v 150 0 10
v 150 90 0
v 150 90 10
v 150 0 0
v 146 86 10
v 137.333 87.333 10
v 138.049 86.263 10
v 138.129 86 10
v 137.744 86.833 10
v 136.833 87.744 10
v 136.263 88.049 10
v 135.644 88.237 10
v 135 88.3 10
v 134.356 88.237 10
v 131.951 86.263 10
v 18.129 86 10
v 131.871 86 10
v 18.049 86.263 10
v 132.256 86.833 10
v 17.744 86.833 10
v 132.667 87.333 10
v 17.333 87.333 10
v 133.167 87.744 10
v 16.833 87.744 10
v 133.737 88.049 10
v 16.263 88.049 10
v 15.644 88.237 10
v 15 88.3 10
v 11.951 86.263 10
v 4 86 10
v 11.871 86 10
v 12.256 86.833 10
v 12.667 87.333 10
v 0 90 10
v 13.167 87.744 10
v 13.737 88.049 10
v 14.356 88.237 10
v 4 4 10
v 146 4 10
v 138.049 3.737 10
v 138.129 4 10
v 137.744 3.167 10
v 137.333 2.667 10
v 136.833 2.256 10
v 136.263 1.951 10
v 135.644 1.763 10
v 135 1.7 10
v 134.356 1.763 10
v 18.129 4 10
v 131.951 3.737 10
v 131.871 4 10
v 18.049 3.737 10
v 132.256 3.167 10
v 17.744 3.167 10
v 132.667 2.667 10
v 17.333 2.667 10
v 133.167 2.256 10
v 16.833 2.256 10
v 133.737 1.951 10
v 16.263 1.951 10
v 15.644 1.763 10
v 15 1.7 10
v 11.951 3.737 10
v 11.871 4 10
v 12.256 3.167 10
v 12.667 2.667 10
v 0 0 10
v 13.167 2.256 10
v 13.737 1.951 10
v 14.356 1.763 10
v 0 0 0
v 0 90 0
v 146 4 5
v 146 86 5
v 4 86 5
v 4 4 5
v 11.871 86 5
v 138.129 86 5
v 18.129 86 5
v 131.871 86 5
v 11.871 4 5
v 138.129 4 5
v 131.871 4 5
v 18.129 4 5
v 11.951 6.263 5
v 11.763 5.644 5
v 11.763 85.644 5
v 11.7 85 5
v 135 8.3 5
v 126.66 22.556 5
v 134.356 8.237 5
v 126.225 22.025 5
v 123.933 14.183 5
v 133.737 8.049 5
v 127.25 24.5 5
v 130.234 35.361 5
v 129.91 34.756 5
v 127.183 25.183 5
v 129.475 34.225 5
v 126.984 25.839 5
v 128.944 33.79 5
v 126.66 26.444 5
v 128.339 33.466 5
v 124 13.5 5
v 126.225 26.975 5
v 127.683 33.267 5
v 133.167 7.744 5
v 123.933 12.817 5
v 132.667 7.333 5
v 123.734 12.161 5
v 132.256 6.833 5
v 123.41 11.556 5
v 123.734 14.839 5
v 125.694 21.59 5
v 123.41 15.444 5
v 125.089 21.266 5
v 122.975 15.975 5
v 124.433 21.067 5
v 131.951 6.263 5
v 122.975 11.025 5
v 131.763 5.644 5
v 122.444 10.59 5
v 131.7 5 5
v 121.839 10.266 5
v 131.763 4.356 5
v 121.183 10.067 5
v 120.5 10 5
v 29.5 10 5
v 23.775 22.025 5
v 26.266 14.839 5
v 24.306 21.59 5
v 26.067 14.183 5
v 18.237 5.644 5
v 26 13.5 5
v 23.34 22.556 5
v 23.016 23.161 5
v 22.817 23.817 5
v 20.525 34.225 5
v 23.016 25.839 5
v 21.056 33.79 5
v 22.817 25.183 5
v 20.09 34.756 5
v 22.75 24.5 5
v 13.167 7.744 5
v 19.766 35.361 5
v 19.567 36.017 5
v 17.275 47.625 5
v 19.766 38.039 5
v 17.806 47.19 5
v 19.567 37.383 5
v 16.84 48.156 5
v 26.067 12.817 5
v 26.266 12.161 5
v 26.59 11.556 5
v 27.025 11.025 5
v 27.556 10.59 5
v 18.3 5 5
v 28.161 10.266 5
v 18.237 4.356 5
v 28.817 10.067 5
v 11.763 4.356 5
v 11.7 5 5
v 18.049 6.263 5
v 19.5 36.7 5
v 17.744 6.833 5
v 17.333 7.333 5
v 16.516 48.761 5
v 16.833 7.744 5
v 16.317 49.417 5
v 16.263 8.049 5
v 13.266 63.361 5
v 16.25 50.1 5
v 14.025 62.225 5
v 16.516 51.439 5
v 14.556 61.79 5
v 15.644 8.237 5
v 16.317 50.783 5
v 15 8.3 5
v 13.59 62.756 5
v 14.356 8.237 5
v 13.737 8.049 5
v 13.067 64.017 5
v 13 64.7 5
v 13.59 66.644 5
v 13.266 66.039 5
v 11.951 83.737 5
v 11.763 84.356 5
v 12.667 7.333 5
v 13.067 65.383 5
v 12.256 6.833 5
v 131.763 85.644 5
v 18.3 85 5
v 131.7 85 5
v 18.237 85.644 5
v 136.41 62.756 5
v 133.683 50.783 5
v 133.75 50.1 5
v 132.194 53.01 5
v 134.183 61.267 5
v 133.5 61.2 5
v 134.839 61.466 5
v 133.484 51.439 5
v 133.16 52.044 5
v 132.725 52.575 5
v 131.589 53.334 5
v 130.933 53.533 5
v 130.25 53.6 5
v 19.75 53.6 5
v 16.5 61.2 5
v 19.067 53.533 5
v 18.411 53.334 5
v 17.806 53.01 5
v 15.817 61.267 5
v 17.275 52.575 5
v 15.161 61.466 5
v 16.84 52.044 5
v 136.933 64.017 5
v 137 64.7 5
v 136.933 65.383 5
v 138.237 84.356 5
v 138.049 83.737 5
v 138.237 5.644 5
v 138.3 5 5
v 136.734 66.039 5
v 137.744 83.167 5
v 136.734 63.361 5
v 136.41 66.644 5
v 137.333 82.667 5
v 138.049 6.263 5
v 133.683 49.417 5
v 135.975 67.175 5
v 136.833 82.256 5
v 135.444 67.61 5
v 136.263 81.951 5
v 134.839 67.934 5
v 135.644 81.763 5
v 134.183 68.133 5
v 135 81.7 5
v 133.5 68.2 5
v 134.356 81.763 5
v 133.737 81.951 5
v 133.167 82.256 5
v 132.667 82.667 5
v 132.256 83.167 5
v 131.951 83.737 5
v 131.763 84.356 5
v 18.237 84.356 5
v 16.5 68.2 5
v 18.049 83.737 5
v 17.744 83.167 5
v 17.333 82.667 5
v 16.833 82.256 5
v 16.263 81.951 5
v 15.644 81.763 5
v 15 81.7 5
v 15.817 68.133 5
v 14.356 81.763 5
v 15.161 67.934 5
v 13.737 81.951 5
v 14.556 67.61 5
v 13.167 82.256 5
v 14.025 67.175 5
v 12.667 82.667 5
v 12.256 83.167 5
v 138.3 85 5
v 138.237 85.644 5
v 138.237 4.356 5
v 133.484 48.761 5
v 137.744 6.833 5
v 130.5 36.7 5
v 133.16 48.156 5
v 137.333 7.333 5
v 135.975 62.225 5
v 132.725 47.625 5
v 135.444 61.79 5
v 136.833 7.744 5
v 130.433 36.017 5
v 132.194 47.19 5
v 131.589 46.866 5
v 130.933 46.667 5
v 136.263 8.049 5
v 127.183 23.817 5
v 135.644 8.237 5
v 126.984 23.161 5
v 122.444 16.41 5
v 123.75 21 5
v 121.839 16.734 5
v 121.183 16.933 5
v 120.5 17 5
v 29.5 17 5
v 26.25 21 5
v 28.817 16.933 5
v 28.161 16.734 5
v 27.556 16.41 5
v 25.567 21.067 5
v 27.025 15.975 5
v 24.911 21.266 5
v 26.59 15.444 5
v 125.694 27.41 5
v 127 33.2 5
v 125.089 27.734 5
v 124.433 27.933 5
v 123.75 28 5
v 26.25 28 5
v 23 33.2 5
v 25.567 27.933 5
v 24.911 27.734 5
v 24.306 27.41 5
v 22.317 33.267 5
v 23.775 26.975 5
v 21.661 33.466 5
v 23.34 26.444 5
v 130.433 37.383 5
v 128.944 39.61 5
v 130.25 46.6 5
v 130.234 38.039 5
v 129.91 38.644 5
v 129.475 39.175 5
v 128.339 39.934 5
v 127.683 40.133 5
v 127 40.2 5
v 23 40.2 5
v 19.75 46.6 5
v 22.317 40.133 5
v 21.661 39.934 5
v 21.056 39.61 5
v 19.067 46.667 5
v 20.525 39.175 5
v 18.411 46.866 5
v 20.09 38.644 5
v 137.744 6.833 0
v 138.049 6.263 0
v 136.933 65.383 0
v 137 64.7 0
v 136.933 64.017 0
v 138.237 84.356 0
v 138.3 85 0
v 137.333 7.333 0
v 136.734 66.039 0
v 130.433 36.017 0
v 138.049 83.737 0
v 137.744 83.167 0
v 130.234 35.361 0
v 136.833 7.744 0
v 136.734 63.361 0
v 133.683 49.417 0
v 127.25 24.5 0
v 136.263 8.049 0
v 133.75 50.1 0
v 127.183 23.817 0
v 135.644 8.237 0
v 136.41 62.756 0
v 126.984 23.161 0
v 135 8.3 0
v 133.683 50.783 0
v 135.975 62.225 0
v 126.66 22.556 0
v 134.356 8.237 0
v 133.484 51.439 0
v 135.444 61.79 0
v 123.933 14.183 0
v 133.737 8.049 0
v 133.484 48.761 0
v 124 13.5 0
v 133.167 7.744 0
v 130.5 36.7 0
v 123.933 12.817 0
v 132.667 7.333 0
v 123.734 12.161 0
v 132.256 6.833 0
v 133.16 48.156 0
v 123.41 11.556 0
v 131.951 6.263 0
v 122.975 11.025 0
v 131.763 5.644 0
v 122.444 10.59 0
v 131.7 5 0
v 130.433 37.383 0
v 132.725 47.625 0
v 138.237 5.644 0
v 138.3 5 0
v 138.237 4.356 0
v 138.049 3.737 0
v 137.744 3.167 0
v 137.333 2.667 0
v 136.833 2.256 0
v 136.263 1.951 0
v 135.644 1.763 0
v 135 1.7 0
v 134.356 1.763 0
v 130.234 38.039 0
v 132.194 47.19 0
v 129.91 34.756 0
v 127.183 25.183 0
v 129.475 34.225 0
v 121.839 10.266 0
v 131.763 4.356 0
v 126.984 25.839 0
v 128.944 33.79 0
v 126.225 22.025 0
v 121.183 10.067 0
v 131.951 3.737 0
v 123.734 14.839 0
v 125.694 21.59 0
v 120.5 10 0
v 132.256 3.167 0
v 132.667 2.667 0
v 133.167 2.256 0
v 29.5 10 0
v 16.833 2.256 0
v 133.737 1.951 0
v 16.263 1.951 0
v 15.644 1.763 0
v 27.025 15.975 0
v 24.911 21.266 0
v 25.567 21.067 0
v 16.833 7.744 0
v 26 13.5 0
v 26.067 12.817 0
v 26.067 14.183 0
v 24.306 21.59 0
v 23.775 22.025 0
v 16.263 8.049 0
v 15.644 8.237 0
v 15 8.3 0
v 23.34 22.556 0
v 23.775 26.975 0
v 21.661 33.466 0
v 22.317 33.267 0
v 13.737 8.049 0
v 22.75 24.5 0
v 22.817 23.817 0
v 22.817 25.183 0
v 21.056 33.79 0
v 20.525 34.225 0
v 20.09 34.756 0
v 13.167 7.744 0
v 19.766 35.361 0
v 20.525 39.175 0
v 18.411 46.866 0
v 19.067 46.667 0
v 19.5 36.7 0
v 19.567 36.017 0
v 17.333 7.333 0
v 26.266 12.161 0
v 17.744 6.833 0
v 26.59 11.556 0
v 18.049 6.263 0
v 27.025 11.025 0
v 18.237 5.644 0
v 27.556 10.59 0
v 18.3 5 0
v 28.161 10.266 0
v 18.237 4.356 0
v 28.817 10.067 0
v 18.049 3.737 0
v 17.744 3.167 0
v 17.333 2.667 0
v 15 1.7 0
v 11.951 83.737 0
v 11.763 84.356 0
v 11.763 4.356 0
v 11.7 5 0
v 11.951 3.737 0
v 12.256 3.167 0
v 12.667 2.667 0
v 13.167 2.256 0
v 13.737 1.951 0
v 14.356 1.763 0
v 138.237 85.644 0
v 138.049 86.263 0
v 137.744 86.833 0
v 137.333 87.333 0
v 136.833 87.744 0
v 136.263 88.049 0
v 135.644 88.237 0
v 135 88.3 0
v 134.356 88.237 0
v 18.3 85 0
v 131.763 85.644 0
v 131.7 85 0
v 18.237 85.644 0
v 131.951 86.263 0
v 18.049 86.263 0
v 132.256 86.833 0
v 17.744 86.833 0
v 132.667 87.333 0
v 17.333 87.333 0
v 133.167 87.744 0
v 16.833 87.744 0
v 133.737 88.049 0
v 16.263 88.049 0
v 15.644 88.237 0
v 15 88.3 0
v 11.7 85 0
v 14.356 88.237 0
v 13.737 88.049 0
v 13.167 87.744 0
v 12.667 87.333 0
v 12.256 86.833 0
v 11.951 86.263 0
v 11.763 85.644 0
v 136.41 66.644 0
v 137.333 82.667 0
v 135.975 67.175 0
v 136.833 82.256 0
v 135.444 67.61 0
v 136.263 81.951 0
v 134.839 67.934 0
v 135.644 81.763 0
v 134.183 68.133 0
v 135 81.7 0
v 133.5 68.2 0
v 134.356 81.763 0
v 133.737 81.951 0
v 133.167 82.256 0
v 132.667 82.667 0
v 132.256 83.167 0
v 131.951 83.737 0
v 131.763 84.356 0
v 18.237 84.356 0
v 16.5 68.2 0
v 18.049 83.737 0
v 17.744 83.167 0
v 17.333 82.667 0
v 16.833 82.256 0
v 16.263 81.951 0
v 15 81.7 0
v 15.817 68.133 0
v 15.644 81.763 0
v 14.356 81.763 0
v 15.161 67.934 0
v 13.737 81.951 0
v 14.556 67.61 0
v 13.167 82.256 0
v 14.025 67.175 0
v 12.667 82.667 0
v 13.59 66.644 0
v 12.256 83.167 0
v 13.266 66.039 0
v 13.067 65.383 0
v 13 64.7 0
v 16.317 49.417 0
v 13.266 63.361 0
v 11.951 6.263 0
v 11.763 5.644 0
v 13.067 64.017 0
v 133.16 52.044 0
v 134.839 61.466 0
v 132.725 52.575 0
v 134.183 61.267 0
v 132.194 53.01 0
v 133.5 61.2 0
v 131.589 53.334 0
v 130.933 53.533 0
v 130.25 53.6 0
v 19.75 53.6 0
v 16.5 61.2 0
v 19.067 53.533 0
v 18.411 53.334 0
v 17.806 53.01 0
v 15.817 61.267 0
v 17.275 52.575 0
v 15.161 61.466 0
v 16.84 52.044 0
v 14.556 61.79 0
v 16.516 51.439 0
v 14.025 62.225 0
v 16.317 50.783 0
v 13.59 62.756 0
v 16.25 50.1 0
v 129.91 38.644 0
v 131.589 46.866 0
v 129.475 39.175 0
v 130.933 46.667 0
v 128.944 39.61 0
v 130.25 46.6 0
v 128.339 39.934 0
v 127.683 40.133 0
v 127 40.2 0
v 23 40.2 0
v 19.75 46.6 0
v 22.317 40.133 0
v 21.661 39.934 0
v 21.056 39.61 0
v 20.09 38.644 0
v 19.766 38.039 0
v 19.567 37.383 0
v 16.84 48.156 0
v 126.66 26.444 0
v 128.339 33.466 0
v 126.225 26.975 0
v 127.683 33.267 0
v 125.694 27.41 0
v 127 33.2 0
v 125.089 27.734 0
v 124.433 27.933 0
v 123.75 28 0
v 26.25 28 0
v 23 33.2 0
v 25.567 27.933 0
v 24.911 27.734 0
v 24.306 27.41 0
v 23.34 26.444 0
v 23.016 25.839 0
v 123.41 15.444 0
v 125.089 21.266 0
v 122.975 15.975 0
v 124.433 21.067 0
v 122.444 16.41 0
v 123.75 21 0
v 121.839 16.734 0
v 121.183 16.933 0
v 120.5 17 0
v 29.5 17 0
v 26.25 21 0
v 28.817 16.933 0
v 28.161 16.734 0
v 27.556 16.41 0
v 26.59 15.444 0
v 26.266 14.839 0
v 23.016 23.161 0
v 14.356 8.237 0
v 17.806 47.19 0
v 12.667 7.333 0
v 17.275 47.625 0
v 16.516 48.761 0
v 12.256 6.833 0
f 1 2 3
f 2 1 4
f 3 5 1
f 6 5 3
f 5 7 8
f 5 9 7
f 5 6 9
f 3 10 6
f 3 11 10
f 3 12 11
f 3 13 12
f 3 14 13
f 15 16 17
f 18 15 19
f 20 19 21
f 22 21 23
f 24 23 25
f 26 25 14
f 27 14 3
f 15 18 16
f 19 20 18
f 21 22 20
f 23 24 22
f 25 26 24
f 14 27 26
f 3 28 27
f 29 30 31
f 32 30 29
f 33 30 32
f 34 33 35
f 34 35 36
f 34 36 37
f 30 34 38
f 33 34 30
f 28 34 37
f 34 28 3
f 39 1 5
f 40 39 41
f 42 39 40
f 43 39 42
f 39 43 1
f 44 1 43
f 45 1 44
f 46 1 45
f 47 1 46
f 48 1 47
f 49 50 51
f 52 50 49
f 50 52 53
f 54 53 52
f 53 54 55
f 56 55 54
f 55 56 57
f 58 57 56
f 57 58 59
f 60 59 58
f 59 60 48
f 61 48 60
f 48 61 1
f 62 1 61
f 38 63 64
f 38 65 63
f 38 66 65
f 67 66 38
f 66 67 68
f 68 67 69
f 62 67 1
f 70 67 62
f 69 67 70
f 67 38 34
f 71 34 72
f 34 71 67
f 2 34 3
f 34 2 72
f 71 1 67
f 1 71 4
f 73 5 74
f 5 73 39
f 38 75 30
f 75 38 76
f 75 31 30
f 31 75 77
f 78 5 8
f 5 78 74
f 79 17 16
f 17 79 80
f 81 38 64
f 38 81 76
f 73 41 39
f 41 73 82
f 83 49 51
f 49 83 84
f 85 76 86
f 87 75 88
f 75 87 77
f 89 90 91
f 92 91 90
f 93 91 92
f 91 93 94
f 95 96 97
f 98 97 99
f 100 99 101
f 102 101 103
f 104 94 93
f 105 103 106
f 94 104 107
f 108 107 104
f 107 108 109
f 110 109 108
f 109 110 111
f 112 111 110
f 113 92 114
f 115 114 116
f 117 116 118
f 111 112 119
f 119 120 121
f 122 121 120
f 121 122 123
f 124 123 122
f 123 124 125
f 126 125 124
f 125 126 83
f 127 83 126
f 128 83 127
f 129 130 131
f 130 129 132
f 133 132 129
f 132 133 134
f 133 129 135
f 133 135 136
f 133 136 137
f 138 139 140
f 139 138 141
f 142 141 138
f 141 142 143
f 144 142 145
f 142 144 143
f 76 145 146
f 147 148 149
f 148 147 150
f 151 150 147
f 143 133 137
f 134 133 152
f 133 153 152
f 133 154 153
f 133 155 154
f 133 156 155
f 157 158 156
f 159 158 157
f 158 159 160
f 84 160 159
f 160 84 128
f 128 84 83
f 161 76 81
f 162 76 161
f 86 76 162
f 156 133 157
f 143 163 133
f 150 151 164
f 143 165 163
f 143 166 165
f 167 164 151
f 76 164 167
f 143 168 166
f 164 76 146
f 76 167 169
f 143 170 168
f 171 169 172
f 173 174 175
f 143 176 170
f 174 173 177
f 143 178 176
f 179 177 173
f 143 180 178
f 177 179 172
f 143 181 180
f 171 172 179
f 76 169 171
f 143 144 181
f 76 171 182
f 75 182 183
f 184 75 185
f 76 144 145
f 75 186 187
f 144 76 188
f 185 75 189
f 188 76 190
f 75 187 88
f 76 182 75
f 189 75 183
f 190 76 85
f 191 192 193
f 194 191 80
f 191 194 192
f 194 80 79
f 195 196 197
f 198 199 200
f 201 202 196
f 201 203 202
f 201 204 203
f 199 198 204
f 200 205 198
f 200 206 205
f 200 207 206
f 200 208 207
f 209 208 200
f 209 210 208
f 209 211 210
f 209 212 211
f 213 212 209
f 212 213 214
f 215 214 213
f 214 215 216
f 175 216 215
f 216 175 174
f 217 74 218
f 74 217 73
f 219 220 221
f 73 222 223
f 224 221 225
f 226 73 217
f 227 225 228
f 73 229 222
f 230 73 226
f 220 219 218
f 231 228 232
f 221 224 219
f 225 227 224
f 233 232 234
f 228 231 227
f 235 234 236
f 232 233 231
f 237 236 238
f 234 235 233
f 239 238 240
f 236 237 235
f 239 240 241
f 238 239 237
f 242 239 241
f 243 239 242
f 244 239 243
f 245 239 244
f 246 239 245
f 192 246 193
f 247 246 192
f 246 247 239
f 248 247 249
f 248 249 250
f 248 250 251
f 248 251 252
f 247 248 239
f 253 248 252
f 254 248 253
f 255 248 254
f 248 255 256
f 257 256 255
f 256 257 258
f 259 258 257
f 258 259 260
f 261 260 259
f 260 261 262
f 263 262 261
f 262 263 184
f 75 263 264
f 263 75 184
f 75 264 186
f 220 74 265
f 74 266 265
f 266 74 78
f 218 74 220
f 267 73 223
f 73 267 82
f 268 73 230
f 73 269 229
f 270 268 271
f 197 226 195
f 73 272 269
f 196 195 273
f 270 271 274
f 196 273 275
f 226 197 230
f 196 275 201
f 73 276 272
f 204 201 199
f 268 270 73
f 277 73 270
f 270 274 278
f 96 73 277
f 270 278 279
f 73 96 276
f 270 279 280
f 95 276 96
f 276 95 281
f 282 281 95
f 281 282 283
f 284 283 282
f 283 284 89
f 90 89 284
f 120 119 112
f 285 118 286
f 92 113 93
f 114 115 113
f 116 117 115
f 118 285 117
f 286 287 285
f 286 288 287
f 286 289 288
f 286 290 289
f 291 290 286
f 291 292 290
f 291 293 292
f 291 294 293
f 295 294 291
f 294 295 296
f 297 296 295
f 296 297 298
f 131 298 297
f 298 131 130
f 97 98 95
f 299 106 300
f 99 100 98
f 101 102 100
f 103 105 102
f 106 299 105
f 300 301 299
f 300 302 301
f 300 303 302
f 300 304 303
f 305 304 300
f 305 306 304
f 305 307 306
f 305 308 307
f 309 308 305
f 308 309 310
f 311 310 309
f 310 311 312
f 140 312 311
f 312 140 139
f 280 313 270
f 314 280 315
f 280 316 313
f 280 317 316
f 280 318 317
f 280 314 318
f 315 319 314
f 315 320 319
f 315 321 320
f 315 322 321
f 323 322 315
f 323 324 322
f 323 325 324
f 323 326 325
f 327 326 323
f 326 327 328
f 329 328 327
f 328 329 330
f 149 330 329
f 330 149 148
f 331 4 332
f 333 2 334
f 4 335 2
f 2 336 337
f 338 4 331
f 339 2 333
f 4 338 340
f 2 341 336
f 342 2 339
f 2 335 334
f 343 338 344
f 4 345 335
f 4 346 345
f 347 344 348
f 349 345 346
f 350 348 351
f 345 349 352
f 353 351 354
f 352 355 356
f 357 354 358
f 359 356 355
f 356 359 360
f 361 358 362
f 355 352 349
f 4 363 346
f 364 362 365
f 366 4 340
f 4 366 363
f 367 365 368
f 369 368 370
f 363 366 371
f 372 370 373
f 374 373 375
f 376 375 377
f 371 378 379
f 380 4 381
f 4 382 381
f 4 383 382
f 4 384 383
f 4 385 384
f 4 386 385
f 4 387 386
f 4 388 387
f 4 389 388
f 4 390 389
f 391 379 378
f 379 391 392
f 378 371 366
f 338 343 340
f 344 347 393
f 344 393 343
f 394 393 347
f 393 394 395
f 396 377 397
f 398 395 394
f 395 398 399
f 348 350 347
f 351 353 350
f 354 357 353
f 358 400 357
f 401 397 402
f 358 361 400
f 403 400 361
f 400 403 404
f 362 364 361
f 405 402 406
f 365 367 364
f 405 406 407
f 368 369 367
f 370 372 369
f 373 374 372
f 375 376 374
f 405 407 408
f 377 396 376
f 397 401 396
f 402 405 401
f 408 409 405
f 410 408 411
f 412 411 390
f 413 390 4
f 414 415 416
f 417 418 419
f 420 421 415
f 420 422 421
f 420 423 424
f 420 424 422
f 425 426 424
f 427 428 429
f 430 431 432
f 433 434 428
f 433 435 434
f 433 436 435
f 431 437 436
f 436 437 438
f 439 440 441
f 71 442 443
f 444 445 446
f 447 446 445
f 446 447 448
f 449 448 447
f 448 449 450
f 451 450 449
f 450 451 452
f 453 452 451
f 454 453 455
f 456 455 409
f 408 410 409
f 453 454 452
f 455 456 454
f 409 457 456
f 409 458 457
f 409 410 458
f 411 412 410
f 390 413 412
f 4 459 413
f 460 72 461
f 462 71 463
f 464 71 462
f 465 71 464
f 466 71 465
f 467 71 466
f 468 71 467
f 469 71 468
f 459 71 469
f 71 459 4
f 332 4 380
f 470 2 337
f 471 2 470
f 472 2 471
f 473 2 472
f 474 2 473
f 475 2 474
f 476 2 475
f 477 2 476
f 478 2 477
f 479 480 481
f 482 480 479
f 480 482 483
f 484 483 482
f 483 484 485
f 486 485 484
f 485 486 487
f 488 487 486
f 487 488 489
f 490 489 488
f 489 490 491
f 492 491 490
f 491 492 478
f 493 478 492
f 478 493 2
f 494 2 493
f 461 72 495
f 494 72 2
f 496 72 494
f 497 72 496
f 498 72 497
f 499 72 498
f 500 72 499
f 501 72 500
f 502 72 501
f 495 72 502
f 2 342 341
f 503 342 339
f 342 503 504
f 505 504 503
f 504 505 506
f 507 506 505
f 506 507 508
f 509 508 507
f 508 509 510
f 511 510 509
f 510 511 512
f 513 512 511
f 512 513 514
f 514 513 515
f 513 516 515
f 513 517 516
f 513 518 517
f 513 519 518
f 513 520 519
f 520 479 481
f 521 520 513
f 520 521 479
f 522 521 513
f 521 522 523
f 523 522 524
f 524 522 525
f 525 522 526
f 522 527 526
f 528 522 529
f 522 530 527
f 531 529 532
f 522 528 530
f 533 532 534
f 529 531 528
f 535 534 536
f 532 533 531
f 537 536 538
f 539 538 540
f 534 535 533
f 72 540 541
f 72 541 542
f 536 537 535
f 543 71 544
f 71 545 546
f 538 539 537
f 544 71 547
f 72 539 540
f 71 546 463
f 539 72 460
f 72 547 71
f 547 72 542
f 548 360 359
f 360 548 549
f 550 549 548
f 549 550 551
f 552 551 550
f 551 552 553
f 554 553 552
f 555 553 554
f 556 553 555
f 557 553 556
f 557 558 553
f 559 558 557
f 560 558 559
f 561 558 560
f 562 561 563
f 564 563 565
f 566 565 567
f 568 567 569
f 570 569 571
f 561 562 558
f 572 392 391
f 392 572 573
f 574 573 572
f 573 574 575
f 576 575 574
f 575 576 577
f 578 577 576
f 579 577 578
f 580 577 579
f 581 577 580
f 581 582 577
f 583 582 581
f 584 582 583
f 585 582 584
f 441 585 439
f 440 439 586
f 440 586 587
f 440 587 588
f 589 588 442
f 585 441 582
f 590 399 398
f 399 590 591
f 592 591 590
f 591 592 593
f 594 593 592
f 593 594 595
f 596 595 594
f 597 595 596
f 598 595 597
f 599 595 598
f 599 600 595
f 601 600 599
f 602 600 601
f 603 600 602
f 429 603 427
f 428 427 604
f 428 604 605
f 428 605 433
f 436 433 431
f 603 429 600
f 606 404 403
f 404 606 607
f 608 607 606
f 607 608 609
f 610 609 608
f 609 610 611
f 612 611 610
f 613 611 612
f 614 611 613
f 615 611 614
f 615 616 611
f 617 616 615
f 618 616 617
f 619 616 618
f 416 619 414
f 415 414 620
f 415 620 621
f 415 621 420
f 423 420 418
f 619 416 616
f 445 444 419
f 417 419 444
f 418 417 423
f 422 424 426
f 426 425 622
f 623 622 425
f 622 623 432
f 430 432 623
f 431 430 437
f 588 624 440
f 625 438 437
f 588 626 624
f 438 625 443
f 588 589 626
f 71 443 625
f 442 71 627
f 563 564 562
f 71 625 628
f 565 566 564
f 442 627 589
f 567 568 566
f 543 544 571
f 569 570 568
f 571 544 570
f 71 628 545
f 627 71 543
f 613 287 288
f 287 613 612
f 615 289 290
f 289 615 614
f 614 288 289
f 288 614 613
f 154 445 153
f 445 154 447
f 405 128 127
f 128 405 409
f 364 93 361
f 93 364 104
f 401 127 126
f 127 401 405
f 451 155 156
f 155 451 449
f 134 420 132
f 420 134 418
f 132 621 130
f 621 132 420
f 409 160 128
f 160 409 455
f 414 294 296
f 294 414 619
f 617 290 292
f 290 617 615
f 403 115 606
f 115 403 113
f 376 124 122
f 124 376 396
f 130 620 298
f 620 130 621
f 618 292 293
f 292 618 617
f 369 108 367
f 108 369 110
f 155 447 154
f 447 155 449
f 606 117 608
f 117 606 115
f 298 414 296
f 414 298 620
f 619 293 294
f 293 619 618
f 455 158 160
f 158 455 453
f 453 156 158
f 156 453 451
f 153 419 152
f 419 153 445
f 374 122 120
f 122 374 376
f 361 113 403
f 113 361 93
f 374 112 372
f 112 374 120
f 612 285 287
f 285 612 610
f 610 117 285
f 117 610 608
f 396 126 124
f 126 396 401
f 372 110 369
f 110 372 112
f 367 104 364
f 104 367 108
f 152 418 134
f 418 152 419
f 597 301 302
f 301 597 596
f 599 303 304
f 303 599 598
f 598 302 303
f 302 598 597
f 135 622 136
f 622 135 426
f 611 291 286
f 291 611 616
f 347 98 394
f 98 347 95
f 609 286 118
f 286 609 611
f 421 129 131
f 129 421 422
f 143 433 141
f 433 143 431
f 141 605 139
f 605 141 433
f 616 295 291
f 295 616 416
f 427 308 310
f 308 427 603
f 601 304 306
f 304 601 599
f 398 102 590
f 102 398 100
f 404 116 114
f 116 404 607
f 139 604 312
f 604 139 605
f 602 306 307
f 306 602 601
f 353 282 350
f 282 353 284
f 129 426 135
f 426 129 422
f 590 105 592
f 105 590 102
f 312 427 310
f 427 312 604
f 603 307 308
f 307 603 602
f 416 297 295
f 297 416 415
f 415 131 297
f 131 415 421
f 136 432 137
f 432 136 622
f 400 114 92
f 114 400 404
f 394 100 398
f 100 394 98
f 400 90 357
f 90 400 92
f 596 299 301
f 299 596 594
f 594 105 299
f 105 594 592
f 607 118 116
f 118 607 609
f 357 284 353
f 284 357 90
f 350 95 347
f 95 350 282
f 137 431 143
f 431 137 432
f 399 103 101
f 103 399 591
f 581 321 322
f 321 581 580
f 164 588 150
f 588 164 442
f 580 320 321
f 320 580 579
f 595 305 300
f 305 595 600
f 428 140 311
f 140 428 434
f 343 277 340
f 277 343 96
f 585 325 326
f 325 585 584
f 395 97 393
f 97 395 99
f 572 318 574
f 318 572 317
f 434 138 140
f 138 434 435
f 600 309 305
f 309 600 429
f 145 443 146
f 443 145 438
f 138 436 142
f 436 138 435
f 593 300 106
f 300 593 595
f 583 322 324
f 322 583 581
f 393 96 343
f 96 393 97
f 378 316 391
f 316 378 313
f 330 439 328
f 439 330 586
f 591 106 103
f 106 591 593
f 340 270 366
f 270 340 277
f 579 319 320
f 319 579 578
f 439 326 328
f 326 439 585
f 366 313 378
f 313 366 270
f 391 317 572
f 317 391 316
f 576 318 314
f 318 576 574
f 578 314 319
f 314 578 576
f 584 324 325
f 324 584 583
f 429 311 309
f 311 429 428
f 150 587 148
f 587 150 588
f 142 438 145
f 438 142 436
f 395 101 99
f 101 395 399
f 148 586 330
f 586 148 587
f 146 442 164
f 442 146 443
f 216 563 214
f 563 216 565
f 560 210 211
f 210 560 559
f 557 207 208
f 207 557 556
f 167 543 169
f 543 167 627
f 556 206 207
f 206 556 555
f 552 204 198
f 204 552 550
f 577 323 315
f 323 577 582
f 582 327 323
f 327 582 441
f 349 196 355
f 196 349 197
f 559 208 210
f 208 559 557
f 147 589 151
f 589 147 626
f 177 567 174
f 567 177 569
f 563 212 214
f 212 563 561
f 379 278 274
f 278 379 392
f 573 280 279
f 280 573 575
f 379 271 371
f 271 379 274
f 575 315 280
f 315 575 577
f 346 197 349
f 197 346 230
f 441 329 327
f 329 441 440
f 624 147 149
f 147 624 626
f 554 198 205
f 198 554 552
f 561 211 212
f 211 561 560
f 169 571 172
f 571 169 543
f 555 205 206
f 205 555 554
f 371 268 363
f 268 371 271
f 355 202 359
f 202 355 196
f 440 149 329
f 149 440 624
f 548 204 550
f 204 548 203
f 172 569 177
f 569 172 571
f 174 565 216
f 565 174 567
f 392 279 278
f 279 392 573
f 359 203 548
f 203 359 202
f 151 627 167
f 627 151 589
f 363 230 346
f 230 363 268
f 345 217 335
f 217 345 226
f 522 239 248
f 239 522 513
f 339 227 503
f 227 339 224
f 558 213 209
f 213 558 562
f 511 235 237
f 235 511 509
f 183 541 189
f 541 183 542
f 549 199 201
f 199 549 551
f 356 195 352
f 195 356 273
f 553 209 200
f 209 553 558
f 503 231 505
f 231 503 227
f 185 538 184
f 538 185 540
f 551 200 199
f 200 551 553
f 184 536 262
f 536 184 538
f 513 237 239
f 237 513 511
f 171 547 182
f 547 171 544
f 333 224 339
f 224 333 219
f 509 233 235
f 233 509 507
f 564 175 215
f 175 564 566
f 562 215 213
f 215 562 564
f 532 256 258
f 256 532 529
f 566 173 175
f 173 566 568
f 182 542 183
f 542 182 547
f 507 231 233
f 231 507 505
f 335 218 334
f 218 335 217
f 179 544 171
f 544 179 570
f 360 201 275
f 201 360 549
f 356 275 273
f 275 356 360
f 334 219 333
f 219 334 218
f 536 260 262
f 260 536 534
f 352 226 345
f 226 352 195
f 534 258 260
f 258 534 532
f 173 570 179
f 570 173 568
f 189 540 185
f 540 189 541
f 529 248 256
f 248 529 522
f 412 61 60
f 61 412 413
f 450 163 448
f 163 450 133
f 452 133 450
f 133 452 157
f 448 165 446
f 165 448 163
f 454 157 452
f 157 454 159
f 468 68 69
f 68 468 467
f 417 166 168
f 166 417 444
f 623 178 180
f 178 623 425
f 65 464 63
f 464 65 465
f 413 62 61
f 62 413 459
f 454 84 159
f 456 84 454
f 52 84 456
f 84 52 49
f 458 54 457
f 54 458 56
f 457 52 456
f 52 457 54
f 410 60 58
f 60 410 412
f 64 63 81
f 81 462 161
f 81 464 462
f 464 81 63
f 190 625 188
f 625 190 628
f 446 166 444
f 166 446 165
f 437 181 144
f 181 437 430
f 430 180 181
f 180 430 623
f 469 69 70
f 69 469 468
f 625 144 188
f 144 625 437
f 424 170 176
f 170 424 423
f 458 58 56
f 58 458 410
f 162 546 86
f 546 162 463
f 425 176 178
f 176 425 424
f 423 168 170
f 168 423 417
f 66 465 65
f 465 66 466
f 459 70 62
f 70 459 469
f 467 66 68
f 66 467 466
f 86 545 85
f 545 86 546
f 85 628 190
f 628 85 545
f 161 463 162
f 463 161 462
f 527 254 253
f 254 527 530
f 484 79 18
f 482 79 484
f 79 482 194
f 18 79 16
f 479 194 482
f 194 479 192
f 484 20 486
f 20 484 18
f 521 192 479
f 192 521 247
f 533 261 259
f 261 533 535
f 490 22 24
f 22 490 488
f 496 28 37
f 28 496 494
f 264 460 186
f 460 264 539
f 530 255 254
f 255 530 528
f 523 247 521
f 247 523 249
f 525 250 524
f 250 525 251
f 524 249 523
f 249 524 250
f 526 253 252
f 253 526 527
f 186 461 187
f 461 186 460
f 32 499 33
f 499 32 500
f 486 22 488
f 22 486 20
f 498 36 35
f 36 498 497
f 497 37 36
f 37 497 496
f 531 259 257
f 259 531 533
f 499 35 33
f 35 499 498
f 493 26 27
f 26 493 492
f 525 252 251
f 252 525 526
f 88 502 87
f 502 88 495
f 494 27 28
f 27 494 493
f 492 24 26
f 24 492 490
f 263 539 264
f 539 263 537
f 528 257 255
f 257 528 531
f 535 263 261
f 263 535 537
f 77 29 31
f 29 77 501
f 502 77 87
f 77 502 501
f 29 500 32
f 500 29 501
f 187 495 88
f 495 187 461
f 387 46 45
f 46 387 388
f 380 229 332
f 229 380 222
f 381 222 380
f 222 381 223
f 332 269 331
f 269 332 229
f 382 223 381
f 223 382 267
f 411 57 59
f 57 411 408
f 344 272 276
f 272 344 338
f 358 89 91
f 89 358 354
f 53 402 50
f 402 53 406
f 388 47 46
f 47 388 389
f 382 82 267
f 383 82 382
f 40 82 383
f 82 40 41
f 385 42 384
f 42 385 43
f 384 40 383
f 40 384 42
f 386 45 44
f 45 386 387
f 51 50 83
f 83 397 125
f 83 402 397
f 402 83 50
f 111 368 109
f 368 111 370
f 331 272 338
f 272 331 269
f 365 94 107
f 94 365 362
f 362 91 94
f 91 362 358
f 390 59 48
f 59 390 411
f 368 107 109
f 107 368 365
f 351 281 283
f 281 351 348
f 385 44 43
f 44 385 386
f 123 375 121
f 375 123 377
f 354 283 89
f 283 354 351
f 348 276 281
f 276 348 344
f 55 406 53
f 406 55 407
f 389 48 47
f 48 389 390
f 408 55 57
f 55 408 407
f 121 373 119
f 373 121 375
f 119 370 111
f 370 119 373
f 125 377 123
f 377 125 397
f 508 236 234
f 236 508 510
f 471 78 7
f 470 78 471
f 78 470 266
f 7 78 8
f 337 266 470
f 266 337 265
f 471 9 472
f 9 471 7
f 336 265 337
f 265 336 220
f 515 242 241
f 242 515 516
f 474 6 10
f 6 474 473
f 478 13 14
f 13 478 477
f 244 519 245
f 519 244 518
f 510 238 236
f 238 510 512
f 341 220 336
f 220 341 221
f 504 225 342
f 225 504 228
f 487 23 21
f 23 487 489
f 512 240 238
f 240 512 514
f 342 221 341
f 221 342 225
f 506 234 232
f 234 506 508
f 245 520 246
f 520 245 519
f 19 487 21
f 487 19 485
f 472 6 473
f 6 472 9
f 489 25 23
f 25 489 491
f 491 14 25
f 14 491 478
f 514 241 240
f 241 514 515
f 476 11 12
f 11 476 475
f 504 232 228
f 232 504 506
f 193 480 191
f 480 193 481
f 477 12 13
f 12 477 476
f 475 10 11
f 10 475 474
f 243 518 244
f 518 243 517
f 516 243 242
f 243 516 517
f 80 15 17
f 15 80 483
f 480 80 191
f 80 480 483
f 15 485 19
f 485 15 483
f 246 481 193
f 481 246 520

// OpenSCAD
$fn = 32;

// ----------------------------------------------------------------------
// Slotted panel: 150 x 90 mm, 5 рядов of slots
// ----------------------------------------------------------------------

// --- parameters (mm) ---
panel_w = 150;            // panel width
panel_d = 90;             // panel depth
thick = 5;                // panel thickness
slot_w = 7;               // slot width
pitch0 = 11;              // first row pitch
pitch_step = 1.2;         // pitch increase per row
margin = 10;              // margin around the slot field
rows = 5;                 // number of slot rows
mount_d = 6.6;            // mounting holes
mount_x = 60;             // mounting hole offset
rim_h = 10;               // rim height
rim_t = 4;                // rim wall thickness

difference() {
  union() {
    cube([panel_w, panel_d, thick]);
    translate([0, 0, thick - 1]) difference() {
      cube([panel_w, panel_d, rim_h - thick + 1]);
      translate([rim_t, rim_t, -2.5]) cube([panel_w - 2 * rim_t, panel_d - 2 * rim_t, rim_h - thick + 6]);
    }
  }
  /* slot rows: stadium shaped cutters, 2.5 mm clear of both faces */
  /* row 0: pitch 11, length 91 */
  hull() {
    translate([29.5, 13.5, -2.5]) cylinder(h = thick + 5, d = slot_w);
    translate([120.5, 13.5, -2.5]) cylinder(h = thick + 5, d = slot_w);
  }
  /* row 1: pitch 12.2, length 97.5 */
  hull() {
    translate([26.25, 24.5, -2.5]) cylinder(h = thick + 5, d = slot_w);
    translate([123.75, 24.5, -2.5]) cylinder(h = thick + 5, d = slot_w);
  }
  /* row 2: pitch 13.4, length 104 */
  hull() {
    translate([23, 36.7, -2.5]) cylinder(h = thick + 5, d = slot_w);
    translate([127, 36.7, -2.5]) cylinder(h = thick + 5, d = slot_w);
  }
  /* row 3: pitch 14.6, length 110.5 */
  hull() {
    translate([19.75, 50.1, -2.5]) cylinder(h = thick + 5, d = slot_w);
    translate([130.25, 50.1, -2.5]) cylinder(h = thick + 5, d = slot_w);
  }
  /* row 4: pitch 15.8, length 117 */
  hull() {
    translate([16.5, 64.7, -2.5]) cylinder(h = thick + 5, d = slot_w);
    translate([133.5, 64.7, -2.5]) cylinder(h = thick + 5, d = slot_w);
  }
  translate([15, 5, -2.5]) cylinder(h = 15, d = mount_d);
  translate([15, 85, -2.5]) cylinder(h = 15, d = mount_d);
  translate([135, 5, -2.5]) cylinder(h = 15, d = mount_d);
  translate([135, 85, -2.5]) cylinder(h = 15, d = mount_d);
}
